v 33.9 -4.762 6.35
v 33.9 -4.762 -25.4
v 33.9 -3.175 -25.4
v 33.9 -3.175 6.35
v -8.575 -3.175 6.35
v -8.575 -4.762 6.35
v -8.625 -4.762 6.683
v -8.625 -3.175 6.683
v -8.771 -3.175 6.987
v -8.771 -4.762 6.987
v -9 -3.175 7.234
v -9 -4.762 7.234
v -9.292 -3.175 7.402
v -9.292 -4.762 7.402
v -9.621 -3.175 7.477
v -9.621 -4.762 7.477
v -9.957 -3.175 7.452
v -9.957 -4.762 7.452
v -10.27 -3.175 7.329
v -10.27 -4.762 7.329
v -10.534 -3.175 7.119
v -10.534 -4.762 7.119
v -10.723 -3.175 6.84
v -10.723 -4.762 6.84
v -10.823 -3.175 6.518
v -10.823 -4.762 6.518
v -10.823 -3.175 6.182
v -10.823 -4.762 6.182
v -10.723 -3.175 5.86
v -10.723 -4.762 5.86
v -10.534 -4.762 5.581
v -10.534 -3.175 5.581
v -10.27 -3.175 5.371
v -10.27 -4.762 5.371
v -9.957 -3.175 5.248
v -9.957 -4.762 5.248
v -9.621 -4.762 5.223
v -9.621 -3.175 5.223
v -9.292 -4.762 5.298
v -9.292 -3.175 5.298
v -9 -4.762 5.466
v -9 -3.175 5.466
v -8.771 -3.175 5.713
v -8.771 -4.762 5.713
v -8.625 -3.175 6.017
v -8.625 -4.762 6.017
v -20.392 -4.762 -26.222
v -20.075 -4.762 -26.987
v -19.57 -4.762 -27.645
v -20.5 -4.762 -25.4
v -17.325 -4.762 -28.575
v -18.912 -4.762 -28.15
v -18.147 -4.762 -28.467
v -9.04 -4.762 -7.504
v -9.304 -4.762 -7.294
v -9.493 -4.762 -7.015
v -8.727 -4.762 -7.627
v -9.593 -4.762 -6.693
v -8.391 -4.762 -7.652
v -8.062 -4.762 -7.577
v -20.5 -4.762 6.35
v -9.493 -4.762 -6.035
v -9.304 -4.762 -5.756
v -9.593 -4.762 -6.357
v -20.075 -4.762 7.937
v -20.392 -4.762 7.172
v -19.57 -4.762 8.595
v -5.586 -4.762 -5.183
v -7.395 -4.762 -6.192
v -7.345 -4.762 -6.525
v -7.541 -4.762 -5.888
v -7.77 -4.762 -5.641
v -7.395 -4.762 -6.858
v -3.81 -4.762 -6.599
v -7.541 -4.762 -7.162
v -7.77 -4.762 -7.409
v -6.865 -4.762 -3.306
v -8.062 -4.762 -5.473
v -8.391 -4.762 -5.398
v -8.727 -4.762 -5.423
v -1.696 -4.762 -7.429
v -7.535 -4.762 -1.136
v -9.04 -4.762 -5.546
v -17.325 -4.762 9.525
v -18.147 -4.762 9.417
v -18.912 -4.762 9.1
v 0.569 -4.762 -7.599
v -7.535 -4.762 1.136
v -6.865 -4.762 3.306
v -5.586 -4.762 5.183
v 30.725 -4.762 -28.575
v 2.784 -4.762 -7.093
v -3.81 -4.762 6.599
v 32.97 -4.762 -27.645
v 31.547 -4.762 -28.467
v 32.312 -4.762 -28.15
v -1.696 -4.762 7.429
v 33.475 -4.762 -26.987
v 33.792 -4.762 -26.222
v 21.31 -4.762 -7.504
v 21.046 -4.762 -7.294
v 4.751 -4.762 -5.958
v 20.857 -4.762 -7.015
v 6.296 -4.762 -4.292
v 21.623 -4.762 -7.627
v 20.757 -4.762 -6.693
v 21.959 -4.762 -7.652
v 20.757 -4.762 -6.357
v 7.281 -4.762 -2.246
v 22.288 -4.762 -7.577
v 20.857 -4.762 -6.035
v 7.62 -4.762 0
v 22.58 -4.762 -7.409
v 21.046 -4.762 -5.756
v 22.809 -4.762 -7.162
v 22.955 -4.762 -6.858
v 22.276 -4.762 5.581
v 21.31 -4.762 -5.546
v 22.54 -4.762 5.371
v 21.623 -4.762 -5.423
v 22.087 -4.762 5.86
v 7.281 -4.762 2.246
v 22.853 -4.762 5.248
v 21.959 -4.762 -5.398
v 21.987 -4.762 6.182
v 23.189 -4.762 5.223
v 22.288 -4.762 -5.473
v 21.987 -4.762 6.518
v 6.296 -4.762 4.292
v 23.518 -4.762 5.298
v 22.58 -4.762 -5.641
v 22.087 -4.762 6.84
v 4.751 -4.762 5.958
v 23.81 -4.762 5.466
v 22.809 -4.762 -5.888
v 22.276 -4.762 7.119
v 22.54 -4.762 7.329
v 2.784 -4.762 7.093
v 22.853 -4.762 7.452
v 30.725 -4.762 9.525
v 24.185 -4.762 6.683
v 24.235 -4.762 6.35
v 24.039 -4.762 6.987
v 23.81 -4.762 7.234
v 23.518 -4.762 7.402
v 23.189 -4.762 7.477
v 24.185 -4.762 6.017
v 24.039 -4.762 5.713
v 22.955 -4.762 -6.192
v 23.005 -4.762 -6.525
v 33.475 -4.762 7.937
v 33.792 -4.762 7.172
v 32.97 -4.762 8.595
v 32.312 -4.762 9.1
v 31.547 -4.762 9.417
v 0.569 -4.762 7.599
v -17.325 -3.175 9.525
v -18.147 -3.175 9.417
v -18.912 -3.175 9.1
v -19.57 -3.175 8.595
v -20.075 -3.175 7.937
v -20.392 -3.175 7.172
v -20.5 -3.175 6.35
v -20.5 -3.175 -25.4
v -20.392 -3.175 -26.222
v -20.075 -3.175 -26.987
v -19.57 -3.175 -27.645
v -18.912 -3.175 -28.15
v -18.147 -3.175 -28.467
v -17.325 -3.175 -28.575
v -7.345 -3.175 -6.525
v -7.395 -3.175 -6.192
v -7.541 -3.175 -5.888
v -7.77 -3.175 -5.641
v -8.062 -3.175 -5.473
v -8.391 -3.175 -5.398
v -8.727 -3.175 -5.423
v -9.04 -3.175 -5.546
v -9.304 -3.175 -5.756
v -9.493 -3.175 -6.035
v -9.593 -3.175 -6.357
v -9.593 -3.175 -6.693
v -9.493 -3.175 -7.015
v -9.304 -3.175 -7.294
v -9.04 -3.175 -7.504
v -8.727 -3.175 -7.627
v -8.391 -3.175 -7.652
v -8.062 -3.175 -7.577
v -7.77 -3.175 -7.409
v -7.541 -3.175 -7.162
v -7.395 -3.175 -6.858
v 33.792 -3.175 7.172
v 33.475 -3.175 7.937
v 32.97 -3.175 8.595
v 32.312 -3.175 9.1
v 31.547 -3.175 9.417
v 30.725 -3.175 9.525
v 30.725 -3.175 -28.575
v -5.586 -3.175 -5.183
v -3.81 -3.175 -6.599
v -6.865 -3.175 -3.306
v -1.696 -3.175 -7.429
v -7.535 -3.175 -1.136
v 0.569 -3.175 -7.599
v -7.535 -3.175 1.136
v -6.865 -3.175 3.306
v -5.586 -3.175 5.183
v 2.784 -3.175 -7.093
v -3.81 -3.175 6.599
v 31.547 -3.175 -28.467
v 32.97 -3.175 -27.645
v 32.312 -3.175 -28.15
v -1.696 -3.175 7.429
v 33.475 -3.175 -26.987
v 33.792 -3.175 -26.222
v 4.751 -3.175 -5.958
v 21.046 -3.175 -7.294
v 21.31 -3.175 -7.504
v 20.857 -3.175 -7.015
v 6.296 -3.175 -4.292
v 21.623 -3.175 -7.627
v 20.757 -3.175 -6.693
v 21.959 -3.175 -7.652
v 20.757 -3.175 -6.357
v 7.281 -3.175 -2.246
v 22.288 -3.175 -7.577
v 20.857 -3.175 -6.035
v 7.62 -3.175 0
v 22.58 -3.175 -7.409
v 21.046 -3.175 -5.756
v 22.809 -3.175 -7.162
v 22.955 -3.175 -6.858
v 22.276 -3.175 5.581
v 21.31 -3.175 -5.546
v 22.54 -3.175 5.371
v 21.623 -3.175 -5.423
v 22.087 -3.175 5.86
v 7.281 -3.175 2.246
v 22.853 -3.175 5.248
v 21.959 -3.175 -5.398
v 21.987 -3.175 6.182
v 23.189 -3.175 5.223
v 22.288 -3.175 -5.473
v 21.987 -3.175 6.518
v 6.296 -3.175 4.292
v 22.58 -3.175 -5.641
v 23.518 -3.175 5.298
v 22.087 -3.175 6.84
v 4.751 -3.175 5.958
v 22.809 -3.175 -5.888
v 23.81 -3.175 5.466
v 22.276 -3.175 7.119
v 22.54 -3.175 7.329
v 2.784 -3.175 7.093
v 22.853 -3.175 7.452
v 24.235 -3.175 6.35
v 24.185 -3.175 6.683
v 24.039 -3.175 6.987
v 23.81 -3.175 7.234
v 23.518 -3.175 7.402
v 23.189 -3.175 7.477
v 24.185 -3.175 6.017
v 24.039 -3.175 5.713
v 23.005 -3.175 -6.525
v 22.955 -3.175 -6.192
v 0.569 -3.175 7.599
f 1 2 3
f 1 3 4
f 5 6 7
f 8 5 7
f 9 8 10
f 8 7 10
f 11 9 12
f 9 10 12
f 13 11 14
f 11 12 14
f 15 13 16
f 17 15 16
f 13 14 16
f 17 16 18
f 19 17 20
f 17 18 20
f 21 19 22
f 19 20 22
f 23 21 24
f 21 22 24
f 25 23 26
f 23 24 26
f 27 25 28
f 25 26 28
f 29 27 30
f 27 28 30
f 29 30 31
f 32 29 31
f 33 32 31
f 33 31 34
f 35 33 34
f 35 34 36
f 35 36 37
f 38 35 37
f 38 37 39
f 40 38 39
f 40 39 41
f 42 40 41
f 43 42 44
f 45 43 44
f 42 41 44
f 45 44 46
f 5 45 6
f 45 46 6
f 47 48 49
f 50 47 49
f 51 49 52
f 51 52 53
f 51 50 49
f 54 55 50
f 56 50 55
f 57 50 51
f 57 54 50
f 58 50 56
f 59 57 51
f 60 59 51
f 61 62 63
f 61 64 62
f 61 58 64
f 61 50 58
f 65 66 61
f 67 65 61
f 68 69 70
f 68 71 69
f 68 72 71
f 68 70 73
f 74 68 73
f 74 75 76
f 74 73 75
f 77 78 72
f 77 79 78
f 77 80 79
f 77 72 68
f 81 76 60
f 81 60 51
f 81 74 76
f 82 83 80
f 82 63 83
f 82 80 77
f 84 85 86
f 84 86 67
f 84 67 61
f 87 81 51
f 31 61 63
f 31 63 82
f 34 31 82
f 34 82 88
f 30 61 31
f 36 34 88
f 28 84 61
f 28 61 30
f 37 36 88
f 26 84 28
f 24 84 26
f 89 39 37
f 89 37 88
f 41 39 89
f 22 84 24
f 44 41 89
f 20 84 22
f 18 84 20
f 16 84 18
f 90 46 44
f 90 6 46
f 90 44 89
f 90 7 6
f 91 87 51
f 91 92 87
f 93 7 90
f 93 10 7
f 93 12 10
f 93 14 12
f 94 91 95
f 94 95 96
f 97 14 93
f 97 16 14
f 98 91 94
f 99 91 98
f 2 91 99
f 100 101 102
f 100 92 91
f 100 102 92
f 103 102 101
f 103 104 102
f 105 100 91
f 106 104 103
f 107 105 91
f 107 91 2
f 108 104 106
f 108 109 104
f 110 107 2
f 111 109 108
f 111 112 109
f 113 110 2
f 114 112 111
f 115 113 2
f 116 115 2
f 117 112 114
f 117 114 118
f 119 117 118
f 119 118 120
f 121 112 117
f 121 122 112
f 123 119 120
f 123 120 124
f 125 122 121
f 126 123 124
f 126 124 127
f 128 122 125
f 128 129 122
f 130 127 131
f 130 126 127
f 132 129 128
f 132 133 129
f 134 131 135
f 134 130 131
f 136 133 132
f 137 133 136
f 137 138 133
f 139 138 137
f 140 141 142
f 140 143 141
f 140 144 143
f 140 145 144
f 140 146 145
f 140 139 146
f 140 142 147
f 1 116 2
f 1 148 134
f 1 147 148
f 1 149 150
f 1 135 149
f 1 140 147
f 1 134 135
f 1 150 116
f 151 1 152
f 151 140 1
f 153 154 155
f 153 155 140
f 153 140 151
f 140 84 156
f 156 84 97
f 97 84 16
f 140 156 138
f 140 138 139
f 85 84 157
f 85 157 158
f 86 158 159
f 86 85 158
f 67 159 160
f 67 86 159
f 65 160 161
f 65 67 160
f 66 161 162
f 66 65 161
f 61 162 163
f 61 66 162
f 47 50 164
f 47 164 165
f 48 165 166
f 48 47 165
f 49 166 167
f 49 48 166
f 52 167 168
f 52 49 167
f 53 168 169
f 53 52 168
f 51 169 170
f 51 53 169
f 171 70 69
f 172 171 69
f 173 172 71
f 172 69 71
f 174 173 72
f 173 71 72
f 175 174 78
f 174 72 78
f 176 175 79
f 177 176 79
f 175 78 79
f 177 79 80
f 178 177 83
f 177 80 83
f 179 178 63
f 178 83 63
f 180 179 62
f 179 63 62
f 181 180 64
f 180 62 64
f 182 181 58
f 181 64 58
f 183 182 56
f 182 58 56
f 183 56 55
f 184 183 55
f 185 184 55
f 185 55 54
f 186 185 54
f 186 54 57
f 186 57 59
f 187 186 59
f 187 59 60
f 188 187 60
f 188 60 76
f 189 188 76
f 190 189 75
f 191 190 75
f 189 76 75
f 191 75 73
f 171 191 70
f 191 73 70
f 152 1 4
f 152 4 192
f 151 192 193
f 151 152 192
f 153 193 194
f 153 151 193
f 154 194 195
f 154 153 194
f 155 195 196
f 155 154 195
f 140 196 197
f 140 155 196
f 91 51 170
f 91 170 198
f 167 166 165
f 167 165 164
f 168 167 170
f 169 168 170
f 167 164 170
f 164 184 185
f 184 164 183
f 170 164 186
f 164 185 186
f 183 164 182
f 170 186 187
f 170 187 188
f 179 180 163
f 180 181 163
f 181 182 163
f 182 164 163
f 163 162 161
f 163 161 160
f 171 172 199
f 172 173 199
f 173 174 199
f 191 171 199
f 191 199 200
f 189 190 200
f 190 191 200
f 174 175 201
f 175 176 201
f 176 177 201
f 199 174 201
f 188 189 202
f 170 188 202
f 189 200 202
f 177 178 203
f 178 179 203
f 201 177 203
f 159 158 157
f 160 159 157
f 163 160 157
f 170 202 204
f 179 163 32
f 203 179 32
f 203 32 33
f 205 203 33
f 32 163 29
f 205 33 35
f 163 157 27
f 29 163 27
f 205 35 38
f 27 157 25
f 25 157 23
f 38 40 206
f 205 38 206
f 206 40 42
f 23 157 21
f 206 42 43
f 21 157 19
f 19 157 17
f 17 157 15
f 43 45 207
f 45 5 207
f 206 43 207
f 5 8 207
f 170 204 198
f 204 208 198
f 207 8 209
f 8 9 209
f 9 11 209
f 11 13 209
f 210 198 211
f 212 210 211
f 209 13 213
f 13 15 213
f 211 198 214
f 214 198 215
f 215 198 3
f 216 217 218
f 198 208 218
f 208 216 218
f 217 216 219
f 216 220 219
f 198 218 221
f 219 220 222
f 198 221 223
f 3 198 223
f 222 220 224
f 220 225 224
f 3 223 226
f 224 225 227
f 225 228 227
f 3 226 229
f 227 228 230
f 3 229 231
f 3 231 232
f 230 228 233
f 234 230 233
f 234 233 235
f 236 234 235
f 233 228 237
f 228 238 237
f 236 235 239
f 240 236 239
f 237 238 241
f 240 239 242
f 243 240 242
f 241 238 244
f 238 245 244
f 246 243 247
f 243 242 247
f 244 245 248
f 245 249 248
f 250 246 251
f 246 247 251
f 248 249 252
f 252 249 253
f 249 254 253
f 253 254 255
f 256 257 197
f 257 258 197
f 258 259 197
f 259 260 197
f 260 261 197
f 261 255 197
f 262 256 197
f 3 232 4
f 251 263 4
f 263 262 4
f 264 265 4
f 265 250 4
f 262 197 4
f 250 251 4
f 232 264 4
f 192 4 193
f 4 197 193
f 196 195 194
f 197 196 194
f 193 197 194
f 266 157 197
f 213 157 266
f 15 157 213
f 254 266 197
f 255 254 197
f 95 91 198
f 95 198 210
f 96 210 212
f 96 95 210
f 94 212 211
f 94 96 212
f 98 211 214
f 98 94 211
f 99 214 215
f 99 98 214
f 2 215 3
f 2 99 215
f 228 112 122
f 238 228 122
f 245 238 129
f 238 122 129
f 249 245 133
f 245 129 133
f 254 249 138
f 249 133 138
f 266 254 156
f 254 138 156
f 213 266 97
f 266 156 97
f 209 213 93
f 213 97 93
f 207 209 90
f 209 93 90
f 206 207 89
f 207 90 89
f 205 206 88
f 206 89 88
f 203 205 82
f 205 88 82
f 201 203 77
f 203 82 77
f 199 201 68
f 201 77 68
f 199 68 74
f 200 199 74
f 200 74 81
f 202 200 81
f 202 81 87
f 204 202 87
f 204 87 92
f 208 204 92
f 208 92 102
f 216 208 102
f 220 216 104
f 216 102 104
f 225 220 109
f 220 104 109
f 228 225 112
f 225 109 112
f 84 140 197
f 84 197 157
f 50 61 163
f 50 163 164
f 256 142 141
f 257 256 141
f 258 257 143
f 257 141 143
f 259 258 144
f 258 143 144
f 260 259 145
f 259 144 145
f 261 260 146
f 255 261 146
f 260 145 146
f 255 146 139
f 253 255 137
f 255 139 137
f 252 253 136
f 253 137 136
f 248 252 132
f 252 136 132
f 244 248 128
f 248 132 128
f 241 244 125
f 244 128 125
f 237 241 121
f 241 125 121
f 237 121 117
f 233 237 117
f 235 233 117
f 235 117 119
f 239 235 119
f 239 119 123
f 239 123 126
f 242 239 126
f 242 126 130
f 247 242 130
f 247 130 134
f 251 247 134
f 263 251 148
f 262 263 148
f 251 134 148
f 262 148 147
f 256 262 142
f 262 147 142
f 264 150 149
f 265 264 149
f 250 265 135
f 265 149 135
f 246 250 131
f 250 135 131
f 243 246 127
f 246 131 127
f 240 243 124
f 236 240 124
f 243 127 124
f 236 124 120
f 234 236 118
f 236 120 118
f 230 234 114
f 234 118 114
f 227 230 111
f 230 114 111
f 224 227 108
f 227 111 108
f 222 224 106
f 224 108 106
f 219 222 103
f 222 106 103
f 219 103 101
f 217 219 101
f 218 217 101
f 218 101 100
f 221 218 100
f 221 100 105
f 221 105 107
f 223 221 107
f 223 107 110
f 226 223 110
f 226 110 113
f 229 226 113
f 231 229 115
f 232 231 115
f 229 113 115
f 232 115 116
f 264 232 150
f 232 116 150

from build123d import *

# Parameters (mm, degrees)
SKETCH_1_R      = 7.62
SKETCH_1_R_2    = 1.1303
EXTRUDE_1_DEPTH = 1.5875


with BuildPart() as part:
    # 草图1 → 凸台-拉伸1 (new body)
    with BuildSketch(Plane.XZ.offset(4.7625)):
        with BuildLine():
            Line((33.9, -25.4), (33.9, 6.35))
            ThreePointArc((33.9, 6.35), (32.97006403, 8.59506403), (30.725, 9.525))
            Line((30.725, 9.525), (-17.325, 9.525))
            ThreePointArc((-17.325, 9.525), (-19.57006403, 8.59506403), (-20.5, 6.35))
            Line((-20.5, 6.35), (-20.5, -25.4))
            ThreePointArc((-20.5, -25.4), (-19.57006403, -27.64506403), (-17.325, -28.575))
            Line((-17.325, -28.575), (30.725, -28.575))
            ThreePointArc((30.725, -28.575), (32.97006403, -27.64506403), (33.9, -25.4))
        make_face()
        Circle(SKETCH_1_R, mode=Mode.SUBTRACT)
        with Locations((-9.705, 6.35)):
            Circle(SKETCH_1_R_2, mode=Mode.SUBTRACT)
        with Locations((23.105, 6.35)):
            Circle(SKETCH_1_R_2, mode=Mode.SUBTRACT)
        with Locations((21.875, -6.525)):
            Circle(SKETCH_1_R_2, mode=Mode.SUBTRACT)
        with Locations((-8.475, -6.525)):
            Circle(SKETCH_1_R_2, mode=Mode.SUBTRACT)
    extrude(amount=-EXTRUDE_1_DEPTH)


solid = part.part
